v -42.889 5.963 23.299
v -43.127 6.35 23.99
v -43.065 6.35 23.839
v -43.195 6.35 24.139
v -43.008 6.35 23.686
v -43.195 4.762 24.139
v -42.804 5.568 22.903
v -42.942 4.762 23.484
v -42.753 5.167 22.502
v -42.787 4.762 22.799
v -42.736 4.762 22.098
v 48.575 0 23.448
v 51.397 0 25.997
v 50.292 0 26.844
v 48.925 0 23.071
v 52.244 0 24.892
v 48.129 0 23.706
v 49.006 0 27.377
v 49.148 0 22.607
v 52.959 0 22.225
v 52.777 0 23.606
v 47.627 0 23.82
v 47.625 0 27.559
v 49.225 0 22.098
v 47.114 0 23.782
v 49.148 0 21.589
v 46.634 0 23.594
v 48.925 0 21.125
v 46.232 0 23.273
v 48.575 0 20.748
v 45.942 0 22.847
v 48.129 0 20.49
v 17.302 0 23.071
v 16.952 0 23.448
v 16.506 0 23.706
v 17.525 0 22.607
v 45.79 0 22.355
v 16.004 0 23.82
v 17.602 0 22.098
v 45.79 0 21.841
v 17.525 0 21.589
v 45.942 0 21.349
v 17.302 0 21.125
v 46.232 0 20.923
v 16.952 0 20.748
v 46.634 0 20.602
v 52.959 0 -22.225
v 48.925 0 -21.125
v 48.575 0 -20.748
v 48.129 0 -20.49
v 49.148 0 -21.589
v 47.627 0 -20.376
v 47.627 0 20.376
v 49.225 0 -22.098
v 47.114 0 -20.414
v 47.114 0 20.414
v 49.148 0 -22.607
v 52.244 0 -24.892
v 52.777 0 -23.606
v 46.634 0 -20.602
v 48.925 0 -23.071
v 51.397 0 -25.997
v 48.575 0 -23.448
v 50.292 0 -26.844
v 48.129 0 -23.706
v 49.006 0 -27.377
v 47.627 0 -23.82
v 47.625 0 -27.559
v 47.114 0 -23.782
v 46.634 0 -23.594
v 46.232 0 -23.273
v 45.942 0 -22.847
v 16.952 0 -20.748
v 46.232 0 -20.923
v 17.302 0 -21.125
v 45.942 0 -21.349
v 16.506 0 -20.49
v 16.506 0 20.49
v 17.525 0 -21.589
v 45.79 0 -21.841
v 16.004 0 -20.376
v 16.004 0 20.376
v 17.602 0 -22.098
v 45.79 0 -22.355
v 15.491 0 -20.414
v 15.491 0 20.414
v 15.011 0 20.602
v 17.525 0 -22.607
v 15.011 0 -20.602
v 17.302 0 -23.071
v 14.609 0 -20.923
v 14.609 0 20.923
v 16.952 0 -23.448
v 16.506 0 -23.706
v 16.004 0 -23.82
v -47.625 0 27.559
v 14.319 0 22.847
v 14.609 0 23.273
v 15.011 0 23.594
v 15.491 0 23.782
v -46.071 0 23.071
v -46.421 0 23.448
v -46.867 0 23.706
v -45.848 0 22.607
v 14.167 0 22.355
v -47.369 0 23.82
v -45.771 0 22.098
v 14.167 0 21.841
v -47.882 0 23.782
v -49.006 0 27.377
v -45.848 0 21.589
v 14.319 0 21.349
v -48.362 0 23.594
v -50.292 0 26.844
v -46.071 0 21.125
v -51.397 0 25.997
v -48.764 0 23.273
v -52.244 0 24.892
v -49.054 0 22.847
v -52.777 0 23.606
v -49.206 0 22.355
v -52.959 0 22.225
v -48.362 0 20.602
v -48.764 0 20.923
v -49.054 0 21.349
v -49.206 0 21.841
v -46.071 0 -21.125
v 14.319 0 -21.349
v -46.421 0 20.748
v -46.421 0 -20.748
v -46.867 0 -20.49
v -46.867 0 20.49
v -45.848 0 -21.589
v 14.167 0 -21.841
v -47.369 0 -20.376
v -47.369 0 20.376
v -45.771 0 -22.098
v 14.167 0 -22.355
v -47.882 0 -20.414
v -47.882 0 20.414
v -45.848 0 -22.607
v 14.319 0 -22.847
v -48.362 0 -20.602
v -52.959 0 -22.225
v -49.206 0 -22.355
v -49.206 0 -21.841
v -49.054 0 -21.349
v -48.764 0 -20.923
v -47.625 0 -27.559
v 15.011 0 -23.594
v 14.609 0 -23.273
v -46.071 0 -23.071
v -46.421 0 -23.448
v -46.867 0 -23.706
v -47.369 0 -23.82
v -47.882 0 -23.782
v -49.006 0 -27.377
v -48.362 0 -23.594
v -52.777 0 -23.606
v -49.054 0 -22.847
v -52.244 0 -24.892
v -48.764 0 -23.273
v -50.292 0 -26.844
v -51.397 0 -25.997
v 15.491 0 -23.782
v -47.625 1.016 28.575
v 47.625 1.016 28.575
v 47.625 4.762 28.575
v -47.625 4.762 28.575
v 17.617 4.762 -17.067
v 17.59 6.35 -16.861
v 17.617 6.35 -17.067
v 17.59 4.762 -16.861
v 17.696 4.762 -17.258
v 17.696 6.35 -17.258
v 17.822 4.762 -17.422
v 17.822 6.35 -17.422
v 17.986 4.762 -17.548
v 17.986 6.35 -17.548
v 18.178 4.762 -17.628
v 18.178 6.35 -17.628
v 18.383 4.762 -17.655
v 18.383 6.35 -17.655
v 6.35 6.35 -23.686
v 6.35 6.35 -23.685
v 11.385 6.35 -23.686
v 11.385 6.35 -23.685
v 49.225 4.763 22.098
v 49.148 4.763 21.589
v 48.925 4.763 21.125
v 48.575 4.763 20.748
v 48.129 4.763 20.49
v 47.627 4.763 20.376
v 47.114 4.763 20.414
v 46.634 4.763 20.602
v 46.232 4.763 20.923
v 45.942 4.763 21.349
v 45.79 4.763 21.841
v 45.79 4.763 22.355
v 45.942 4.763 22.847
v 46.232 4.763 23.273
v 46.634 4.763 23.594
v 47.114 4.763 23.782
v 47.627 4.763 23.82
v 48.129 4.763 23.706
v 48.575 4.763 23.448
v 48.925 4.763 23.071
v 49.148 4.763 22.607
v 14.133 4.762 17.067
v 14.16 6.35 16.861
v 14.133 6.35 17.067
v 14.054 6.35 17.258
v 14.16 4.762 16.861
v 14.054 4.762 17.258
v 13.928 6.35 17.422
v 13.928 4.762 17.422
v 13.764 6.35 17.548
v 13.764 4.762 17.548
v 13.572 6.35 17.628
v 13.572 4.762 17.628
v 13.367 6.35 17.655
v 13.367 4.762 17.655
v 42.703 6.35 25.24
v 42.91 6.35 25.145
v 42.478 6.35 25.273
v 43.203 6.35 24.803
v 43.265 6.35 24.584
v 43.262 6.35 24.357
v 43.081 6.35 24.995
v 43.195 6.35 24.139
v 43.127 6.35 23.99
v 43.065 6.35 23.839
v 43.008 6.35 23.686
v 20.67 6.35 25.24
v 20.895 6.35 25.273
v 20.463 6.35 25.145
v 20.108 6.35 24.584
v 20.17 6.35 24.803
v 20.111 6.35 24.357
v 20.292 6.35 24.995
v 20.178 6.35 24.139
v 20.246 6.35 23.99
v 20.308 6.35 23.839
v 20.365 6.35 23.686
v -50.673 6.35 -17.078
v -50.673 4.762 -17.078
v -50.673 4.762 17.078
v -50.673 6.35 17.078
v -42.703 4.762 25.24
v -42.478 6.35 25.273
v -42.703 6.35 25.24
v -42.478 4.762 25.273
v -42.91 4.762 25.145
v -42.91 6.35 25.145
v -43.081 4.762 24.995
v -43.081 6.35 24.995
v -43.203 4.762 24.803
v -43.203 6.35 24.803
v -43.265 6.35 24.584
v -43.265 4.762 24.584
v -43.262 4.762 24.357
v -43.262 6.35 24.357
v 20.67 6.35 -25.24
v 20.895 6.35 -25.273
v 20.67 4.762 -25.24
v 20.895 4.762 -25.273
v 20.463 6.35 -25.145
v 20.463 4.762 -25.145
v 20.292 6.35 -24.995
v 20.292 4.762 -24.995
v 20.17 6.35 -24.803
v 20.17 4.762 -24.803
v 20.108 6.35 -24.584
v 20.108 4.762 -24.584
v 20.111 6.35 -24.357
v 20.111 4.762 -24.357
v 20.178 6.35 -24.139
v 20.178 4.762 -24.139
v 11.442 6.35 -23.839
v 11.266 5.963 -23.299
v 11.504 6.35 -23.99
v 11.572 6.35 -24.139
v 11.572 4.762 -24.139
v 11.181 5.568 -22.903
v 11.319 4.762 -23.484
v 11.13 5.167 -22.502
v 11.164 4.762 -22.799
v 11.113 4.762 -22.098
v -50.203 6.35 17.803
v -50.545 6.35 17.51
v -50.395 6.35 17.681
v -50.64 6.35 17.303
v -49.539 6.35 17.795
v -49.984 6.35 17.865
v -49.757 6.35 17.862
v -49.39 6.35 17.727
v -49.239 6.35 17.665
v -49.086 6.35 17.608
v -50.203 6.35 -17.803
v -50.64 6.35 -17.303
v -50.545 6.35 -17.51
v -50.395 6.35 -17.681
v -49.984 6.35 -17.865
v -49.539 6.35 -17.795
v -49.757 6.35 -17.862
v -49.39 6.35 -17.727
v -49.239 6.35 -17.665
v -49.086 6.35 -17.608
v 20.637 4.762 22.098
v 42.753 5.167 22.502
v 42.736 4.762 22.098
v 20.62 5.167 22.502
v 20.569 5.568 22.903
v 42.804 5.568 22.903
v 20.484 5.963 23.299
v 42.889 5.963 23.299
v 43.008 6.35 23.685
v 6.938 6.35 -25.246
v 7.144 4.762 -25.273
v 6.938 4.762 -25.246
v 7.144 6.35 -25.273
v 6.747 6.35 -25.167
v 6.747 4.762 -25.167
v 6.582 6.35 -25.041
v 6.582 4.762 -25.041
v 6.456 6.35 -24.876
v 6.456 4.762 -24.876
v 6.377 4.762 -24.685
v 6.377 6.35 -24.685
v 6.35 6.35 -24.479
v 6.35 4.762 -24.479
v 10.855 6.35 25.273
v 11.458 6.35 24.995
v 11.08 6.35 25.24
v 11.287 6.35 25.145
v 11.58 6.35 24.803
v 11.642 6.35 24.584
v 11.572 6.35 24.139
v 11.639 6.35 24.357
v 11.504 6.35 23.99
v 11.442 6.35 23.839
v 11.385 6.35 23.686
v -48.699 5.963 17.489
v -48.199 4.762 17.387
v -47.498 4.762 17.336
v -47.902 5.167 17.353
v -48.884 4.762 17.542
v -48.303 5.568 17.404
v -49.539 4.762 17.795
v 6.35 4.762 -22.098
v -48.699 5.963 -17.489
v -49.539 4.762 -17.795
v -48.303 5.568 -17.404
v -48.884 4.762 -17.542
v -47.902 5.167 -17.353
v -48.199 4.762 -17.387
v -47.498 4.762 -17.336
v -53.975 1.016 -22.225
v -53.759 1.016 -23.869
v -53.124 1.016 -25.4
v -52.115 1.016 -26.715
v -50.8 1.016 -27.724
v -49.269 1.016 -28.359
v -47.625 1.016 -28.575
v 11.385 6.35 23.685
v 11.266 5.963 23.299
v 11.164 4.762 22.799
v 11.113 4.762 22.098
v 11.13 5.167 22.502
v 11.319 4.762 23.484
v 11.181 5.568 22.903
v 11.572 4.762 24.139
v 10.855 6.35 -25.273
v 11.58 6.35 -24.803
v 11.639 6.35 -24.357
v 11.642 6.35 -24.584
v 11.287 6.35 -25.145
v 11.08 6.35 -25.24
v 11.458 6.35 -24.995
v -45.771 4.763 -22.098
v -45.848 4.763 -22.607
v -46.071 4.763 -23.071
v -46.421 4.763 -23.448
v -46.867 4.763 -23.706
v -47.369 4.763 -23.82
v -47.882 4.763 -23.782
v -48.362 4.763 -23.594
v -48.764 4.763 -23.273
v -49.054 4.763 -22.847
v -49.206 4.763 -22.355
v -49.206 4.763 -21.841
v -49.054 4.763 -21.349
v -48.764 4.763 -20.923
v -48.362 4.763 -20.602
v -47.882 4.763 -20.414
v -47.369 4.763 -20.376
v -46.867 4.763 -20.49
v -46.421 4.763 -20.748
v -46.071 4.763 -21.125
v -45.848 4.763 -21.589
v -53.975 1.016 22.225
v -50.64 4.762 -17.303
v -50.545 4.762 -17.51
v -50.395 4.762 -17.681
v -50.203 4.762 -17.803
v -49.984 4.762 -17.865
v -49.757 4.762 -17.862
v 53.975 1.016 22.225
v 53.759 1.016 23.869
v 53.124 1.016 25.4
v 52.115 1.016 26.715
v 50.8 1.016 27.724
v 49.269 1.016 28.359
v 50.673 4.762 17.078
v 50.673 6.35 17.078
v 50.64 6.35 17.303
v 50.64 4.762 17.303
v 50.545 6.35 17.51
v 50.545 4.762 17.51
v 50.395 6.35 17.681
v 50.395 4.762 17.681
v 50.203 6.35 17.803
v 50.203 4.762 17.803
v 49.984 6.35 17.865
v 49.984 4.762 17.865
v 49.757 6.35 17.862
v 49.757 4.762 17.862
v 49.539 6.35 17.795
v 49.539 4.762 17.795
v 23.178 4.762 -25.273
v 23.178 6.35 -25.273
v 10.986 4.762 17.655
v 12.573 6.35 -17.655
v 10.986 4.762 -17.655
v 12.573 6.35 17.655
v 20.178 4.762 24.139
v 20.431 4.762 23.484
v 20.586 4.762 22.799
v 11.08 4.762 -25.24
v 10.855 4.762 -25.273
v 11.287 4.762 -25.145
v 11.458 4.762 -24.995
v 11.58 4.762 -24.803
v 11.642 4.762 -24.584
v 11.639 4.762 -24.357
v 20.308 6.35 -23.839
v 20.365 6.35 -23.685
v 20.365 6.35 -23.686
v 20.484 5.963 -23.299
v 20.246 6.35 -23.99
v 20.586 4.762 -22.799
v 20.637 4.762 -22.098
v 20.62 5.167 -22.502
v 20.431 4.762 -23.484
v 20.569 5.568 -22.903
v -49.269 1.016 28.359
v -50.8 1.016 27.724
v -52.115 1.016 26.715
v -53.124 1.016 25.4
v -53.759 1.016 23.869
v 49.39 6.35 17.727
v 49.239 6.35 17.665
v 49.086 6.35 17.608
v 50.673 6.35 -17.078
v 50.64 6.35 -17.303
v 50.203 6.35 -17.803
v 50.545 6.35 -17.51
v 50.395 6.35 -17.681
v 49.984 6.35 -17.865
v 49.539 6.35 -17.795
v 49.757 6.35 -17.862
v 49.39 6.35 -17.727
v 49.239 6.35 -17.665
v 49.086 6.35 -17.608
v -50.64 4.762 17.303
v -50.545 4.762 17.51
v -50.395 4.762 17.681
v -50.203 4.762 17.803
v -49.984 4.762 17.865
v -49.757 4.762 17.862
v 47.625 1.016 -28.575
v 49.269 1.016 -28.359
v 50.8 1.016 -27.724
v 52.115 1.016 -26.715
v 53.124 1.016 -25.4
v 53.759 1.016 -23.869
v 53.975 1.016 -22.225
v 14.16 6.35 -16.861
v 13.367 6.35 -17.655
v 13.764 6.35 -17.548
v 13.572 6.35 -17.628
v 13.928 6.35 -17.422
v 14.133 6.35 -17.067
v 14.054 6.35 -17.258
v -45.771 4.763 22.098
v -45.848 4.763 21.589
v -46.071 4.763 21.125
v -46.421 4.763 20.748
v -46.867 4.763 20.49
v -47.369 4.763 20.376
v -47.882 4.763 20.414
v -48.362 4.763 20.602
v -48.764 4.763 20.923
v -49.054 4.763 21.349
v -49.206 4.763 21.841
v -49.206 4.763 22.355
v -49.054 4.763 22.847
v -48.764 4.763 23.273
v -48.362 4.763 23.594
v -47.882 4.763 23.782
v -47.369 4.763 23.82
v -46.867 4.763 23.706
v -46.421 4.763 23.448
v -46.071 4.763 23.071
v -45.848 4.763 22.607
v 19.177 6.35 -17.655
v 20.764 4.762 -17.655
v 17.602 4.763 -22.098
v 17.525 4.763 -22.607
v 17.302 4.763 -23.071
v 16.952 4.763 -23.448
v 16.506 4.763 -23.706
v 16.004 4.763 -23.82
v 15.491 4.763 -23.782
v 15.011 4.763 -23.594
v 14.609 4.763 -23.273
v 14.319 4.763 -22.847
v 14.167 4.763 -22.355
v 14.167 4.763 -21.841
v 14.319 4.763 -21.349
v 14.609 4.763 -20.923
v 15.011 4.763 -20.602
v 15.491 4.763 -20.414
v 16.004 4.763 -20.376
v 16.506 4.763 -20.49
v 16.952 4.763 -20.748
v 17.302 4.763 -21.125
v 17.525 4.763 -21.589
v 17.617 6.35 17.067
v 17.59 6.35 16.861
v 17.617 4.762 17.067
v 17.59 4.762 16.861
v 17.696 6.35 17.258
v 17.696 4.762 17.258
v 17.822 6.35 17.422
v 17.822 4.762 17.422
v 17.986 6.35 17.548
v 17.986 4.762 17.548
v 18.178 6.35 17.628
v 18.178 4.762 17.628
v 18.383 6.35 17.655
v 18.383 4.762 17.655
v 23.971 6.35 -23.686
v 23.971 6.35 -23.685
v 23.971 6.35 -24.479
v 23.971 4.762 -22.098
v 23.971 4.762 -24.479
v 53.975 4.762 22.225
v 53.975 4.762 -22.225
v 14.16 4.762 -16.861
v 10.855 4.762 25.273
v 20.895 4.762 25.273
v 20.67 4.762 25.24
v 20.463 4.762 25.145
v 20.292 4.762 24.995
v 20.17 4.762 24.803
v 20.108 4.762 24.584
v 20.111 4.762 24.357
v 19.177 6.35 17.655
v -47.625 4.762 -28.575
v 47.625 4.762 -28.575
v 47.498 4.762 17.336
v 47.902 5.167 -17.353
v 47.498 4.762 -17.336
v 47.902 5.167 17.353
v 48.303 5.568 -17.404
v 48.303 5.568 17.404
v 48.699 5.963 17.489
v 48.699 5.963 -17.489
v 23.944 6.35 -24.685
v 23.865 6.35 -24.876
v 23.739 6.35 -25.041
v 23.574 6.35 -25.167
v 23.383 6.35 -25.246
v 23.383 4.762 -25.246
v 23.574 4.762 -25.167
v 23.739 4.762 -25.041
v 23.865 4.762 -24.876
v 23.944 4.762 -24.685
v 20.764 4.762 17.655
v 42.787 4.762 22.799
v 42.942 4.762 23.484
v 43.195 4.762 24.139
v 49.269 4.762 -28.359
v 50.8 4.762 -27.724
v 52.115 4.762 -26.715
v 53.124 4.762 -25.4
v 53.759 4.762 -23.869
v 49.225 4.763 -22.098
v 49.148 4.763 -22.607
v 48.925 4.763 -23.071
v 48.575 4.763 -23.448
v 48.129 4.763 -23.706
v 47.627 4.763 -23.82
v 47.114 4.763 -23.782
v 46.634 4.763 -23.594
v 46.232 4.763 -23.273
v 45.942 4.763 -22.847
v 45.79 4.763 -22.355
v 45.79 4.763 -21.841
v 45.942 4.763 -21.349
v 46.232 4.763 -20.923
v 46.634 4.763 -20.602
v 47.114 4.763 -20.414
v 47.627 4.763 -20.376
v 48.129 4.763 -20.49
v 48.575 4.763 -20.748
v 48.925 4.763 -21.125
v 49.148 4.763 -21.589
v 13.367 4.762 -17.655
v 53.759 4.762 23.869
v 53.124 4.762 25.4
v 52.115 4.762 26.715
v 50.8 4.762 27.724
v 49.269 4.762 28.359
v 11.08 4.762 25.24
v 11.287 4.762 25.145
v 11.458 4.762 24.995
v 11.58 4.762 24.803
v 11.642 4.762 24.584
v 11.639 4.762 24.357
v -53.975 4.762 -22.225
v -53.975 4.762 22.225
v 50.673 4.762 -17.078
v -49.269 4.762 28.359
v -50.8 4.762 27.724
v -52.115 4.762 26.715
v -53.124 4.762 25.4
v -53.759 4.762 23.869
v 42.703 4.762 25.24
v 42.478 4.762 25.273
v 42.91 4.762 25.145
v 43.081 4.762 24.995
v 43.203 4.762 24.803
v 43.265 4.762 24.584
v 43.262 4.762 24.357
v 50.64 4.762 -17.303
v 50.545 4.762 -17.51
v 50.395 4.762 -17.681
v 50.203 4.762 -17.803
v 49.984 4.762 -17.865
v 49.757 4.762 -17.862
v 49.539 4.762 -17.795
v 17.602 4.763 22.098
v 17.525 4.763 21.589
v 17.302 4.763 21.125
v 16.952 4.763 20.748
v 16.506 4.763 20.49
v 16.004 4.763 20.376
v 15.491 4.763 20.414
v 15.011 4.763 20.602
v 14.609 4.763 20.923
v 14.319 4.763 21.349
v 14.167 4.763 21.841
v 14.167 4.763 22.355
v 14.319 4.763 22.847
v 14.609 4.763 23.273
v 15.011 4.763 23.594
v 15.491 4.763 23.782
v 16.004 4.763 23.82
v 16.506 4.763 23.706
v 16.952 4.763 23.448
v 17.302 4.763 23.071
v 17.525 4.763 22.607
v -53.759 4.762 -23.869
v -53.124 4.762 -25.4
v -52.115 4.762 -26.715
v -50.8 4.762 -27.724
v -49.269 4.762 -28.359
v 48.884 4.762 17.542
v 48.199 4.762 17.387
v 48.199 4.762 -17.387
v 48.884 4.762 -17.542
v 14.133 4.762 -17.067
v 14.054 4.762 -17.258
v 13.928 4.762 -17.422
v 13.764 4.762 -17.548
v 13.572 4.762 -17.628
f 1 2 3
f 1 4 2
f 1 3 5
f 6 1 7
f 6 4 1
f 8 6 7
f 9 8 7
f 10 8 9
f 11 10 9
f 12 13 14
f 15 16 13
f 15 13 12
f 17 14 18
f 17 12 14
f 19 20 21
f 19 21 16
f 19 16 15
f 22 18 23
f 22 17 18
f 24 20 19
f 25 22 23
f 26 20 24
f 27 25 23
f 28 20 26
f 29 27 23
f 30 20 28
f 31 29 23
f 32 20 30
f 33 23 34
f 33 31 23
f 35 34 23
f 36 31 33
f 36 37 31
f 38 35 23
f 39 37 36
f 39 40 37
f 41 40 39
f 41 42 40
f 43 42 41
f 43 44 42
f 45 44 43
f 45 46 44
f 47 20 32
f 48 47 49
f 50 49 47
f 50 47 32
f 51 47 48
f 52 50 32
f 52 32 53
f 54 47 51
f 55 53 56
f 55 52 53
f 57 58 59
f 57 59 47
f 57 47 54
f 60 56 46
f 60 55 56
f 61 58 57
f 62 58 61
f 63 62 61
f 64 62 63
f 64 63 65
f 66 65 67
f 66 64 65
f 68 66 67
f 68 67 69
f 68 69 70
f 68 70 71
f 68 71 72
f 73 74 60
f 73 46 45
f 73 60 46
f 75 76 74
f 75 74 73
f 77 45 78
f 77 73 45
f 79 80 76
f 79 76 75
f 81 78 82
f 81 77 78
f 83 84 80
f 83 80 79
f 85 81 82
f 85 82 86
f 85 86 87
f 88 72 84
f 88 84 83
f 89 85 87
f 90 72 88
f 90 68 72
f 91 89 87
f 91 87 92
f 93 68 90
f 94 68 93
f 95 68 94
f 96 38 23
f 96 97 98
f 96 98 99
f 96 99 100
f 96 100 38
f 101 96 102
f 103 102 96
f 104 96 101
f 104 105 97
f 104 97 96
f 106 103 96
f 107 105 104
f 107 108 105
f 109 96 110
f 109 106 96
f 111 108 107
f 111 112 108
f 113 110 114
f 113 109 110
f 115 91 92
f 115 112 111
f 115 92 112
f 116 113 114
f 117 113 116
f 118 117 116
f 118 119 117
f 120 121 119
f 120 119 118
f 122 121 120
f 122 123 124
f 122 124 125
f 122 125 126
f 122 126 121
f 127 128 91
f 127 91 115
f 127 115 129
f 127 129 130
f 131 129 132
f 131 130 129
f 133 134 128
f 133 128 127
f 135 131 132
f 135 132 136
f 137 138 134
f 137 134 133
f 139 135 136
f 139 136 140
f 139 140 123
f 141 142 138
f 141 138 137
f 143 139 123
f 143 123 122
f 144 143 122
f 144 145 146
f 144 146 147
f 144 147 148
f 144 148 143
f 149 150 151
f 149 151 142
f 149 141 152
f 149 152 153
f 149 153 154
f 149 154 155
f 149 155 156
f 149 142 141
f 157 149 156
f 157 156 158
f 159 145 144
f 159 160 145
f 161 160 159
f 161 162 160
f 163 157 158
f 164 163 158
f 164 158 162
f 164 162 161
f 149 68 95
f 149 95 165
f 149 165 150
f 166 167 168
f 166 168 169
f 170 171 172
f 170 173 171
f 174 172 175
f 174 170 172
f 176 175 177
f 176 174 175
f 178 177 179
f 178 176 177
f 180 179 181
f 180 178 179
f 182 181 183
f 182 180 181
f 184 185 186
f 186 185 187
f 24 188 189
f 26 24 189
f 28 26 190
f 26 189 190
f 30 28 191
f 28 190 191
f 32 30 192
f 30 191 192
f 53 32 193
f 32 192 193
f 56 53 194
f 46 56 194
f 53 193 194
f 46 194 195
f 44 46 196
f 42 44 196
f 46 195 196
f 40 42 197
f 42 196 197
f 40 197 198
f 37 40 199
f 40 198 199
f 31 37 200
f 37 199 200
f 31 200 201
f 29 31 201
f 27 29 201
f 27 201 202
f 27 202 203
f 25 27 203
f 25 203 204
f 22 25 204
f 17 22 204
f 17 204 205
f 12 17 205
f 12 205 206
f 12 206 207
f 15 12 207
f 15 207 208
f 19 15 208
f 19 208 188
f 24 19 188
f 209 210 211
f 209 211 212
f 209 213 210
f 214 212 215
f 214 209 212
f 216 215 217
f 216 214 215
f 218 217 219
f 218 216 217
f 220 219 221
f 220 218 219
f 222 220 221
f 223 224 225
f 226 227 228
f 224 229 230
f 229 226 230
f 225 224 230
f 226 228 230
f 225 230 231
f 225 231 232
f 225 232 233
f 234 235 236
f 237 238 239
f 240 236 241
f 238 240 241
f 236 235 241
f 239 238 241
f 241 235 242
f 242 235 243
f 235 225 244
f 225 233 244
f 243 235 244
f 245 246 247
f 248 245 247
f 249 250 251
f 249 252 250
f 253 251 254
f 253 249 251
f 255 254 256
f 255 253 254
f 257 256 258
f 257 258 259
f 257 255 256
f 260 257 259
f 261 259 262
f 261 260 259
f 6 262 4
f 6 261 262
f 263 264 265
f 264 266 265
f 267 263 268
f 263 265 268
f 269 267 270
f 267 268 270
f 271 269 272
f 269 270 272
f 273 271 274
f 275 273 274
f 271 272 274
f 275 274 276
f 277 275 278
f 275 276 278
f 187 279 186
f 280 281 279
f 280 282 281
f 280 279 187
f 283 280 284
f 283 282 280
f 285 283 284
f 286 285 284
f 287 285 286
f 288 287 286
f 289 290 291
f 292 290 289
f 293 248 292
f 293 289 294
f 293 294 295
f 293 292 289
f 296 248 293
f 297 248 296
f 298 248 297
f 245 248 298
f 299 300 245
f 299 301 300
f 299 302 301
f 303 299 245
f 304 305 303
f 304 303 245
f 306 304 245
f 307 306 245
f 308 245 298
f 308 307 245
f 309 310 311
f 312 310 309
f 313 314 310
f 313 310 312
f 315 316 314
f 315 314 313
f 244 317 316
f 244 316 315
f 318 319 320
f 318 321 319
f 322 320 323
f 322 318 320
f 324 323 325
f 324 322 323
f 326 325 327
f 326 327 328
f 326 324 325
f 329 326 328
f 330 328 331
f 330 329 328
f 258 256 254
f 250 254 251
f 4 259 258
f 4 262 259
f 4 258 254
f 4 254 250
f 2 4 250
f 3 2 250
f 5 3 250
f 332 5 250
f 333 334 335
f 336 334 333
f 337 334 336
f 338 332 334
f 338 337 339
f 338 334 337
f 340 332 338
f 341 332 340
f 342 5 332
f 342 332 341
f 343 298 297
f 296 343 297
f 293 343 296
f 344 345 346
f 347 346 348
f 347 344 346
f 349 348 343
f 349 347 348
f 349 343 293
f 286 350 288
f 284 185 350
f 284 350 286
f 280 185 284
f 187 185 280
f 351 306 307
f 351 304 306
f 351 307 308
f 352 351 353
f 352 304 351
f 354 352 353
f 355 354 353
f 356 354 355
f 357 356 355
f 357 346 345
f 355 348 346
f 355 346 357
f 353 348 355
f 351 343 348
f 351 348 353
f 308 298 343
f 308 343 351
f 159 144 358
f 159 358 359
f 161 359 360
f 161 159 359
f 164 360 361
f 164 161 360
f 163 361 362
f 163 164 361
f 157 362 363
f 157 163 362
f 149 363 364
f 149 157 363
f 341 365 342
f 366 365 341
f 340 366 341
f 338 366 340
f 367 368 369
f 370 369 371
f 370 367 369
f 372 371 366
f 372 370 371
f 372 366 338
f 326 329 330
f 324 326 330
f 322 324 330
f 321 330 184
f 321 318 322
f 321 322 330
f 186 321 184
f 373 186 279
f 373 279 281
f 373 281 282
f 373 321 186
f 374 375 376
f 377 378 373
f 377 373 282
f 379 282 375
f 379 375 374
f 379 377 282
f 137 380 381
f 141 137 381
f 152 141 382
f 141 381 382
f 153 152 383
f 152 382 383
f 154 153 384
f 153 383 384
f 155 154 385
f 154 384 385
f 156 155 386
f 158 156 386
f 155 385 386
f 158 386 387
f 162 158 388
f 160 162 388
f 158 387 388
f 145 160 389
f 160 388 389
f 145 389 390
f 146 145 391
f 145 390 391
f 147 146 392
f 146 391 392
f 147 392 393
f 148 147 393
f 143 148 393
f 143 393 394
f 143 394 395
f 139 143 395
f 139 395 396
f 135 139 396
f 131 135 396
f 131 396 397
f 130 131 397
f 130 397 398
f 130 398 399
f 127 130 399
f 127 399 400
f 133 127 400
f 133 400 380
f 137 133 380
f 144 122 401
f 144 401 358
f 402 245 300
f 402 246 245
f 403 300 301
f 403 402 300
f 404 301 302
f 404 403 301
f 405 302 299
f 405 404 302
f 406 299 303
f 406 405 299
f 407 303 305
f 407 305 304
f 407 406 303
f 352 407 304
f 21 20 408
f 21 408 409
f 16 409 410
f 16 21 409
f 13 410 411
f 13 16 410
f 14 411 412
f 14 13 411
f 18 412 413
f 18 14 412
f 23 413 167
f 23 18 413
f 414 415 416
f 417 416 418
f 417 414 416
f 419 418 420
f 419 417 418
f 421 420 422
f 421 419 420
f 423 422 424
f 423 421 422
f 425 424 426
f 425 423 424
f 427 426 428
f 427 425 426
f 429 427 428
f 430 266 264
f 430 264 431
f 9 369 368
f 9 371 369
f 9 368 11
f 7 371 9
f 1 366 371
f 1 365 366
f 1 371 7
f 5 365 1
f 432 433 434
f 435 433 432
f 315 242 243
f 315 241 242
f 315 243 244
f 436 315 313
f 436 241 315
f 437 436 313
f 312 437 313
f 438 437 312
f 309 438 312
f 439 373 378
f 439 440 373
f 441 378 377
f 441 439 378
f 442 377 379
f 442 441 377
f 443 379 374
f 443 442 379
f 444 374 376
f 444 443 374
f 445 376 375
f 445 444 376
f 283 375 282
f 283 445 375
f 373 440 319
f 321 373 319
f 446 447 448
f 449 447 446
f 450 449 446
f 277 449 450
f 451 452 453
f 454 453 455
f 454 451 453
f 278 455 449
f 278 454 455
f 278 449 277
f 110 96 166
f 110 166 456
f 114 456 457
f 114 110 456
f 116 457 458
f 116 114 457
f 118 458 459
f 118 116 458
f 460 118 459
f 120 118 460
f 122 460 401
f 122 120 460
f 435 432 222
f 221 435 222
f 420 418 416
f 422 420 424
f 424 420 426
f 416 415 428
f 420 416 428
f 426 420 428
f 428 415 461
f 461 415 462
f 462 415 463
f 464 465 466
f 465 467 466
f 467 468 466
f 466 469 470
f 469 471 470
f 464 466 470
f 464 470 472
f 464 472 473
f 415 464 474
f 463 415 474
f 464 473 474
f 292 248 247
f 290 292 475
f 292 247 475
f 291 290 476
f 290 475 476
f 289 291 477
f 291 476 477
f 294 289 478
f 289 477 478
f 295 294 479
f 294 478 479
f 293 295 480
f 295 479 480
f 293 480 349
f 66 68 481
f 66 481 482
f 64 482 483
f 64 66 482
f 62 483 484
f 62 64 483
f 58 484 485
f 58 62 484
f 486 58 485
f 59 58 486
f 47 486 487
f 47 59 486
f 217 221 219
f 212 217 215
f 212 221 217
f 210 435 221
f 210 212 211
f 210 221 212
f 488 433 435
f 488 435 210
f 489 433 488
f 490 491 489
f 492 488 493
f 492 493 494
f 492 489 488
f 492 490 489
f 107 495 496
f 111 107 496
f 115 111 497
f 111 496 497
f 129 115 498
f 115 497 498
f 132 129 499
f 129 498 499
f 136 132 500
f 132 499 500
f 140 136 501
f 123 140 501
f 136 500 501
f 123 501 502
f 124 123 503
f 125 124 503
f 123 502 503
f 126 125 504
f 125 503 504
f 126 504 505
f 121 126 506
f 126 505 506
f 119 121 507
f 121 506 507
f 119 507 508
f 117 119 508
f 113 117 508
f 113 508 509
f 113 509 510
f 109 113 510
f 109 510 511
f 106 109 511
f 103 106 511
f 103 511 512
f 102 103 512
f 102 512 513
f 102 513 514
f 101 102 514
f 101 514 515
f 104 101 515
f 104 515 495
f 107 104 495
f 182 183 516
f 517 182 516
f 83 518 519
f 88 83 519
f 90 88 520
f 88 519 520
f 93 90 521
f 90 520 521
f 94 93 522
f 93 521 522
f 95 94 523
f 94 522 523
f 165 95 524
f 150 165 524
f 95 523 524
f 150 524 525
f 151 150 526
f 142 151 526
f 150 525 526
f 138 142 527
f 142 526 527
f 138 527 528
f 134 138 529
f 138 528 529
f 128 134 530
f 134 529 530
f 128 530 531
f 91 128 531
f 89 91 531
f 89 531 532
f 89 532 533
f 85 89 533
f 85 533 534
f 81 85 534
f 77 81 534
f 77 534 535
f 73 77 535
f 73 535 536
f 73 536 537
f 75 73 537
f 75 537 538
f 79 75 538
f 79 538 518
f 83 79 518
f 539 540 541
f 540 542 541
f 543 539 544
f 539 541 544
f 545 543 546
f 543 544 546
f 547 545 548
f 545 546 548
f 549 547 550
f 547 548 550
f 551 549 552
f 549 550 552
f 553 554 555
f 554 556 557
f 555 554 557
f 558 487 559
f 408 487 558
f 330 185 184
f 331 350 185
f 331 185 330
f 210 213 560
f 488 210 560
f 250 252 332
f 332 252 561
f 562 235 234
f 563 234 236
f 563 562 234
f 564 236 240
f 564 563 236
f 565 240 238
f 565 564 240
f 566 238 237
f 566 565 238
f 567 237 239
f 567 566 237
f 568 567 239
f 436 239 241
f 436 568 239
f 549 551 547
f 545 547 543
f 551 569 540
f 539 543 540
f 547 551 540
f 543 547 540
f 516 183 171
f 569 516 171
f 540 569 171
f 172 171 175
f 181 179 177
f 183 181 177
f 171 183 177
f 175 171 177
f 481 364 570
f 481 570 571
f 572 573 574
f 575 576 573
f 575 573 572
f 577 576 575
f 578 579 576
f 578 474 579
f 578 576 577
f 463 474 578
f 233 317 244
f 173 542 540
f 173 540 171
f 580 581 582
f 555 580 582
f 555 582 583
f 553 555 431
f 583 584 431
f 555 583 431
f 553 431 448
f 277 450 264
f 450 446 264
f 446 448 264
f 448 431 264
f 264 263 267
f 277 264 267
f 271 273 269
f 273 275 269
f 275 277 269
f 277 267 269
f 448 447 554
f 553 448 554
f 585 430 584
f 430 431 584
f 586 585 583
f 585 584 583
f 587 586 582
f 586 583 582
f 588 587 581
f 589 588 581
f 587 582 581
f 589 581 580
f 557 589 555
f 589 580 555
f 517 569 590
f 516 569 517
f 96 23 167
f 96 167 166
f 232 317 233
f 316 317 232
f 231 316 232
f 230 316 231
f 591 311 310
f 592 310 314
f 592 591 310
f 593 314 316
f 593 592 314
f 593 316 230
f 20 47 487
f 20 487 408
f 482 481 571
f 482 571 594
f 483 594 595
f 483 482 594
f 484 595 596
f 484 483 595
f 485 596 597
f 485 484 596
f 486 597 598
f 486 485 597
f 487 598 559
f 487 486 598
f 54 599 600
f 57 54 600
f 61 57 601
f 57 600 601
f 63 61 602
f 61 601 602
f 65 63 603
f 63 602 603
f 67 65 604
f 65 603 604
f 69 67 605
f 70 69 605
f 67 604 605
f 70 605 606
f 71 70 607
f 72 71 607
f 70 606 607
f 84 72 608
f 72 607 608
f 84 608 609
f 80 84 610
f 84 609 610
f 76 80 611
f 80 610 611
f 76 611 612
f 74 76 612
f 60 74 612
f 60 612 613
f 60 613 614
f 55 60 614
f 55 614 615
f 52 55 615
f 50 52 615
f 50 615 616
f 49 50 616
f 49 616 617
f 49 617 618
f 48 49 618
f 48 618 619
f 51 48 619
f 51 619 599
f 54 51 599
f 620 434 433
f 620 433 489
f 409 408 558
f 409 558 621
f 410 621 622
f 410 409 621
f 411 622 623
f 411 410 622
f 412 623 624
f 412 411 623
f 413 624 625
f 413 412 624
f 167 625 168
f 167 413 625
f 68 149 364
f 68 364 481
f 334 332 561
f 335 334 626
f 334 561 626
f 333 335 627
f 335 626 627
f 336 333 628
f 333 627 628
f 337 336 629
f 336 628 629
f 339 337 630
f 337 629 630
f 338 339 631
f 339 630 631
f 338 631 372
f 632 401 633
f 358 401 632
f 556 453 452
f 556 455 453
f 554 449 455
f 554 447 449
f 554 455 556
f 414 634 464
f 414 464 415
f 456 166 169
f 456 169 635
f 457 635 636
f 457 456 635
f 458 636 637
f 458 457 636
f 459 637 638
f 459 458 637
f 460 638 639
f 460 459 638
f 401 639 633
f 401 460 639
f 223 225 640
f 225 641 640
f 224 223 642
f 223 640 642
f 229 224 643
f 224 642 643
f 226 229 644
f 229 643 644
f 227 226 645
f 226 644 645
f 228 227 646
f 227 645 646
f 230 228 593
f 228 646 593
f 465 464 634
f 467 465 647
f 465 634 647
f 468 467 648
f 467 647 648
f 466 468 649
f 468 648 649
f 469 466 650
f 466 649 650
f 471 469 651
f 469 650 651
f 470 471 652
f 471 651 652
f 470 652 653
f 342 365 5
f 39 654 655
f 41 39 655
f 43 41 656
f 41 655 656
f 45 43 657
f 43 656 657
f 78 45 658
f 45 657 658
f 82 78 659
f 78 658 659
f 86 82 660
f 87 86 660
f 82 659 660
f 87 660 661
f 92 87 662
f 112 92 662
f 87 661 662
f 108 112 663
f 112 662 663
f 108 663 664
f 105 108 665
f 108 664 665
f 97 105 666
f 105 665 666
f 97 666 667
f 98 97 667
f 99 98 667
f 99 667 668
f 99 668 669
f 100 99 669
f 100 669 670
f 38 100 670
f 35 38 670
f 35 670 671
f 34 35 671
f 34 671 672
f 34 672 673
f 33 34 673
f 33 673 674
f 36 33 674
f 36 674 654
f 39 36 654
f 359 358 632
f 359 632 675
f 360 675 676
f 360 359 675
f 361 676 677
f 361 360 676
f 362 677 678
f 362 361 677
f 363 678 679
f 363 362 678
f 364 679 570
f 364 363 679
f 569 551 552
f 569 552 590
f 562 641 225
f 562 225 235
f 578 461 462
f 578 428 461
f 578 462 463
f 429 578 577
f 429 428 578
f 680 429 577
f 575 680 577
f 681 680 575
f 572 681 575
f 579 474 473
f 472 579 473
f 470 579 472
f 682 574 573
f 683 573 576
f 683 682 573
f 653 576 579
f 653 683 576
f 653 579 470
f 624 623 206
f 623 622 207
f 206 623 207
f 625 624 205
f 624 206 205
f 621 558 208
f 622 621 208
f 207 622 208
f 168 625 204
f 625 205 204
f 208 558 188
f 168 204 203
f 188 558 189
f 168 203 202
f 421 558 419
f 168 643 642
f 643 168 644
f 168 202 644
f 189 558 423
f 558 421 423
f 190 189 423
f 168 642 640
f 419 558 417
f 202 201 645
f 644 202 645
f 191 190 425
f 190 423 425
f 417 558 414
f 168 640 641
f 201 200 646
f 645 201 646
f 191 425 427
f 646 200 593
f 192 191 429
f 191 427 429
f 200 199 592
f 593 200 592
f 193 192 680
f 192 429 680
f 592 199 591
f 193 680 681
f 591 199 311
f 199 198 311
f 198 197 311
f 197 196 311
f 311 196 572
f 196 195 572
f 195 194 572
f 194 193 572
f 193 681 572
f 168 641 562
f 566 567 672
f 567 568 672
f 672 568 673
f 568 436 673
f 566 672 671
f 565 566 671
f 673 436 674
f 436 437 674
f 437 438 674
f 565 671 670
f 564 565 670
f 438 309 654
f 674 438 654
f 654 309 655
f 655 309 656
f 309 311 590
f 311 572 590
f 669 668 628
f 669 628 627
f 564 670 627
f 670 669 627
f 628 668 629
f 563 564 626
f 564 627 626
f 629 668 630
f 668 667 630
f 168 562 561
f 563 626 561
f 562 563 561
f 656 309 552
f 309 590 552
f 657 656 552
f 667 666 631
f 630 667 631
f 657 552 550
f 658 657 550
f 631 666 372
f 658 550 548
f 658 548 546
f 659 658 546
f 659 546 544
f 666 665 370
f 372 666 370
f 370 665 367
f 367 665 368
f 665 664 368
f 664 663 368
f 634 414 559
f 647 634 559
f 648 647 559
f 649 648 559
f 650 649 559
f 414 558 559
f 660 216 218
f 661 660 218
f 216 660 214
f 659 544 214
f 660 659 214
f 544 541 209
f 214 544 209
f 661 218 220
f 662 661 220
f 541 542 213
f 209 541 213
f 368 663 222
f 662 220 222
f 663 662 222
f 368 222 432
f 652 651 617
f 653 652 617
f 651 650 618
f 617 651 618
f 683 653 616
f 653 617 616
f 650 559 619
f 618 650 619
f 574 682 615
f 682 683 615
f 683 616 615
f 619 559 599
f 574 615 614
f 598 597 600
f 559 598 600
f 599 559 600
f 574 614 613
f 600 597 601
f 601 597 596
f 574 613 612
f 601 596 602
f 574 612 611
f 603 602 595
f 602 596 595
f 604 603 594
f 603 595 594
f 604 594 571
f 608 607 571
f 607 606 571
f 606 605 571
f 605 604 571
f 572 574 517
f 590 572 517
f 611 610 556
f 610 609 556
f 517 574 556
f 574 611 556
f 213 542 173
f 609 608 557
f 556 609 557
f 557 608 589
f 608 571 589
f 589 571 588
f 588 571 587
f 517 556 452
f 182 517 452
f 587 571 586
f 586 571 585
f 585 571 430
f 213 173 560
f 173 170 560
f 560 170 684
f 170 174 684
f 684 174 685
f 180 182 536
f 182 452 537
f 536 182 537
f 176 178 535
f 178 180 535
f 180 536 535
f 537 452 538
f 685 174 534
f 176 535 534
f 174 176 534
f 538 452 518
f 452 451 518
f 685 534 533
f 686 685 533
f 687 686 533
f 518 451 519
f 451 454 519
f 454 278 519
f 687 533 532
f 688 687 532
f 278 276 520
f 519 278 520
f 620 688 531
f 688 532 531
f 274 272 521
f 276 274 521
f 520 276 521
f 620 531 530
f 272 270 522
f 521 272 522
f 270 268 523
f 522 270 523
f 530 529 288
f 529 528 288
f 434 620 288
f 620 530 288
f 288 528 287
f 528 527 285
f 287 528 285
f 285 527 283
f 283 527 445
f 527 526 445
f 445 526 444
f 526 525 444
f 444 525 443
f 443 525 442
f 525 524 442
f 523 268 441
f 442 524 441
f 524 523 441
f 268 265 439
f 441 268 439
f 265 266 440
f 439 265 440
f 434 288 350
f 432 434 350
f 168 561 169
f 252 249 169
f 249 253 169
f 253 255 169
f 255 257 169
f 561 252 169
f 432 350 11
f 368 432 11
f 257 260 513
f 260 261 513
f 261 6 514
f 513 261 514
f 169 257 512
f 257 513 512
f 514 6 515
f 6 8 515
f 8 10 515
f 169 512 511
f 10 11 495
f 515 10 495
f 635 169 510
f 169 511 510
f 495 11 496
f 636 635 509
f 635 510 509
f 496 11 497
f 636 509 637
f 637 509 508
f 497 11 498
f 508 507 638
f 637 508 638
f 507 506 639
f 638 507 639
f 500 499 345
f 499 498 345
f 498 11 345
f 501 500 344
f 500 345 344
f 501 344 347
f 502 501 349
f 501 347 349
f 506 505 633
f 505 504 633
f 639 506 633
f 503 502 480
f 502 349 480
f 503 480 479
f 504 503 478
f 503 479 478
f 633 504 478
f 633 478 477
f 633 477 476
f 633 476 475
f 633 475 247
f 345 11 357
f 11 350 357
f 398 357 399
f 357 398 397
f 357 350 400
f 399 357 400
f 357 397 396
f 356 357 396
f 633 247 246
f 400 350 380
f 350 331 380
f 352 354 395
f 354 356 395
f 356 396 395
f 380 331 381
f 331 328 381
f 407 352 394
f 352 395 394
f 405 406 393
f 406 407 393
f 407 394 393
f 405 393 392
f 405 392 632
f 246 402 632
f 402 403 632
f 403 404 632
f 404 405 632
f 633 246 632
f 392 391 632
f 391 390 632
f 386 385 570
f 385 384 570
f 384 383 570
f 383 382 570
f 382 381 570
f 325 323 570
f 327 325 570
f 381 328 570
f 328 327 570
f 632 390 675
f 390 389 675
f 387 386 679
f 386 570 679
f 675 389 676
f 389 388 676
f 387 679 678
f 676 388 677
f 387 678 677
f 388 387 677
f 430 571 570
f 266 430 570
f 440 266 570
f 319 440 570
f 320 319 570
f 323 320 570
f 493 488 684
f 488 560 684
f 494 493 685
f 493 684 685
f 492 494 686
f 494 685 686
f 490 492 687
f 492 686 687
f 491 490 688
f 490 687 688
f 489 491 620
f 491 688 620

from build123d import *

# Parameters (mm, degrees)
BOSS_EXTRUDE1_DEPTH   = 4.7625
BOSS_EXTRUDE2_DEPTH   = 1.5875
SKETCH3_W             = 50.8
SKETCH3_H             = 1.5875
SKETCH3_W_2           = 20.32
CUT_EXTRUDE1_DEPTH    = 62.257755886
F_4_CLEARANCE_HOLE1_D = 3.4544
SKETCH6_R             = 4.7625
CUT_EXTRUDE2_DEPTH    = 62.257755886
SKETCH7_W             = 8.127020596
SKETCH7_H             = 2.415508094
SKETCH7_W_2           = 9.383301438
SKETCH7_H_2           = 3.436417543
CUT_EXTRUDE3_DEPTH    = 62.257755886
CHAMFER1_SIZE         = 1.5875
FILLET1_R             = 0.79375
CHAMFER2_SIZE         = 1.016


with BuildPart() as part:
    # Sketch1 → Boss-Extrude1 (new body)
    with BuildSketch(Plane(origin=(0, 0, 0), x_dir=(1, 0, 0), z_dir=(0, 1, 0))):
        with BuildLine():
            Line((-47.625, 28.575), (47.625, 28.575))
            ThreePointArc((47.625, 28.575), (52.115128061, 26.715128061), (53.975, 22.225))
            Line((53.975, 22.225), (53.975, -22.225))
            ThreePointArc((53.975, -22.225), (52.115128061, -26.715128061), (47.625, -28.575))
            Line((47.625, -28.575), (-47.625, -28.575))
            ThreePointArc((-47.625, -28.575), (-52.115128061, -26.715128061), (-53.975, -22.225))
            Line((-53.975, -22.225), (-53.975, 22.225))
            ThreePointArc((-53.975, 22.225), (-52.115128061, 26.715128061), (-47.625, 28.575))
        make_face()
    extrude(amount=BOSS_EXTRUDE1_DEPTH)

    # Sketch2 → Boss-Extrude2 (add)
    # profile 1 of 2: a face of its own
    with BuildSketch(Plane(origin=(0, 4.7625, 0), x_dir=(1, 0, 0), z_dir=(0, 1, 0))):
        with BuildLine():
            Line((-50.673, 22.225), (-50.673, -22.225))
            ThreePointArc((-50.673, -22.225), (-49.780261469, -24.380261469), (-47.625, -25.273))
            Line((-47.625, -25.273), (14.1605, -25.273))
            Line((14.1605, -25.273), (14.1605, 25.273))
            Line((14.1605, 25.273), (-47.625, 25.273))
            ThreePointArc((-47.625, 25.273), (-49.780261469, 24.380261469), (-50.673, 22.225))
        make_face()
        with BuildLine():
            Line((12.573, -23.6855), (-47.625, -23.6855))
            ThreePointArc((-47.625, -23.6855), (-48.657729454, -23.257729454), (-49.0855, -22.225))
            Line((-49.0855, -22.225), (-49.0855, 22.225))
            ThreePointArc((-49.0855, 22.225), (-48.657729454, 23.257729454), (-47.625, 23.6855))
            Line((-47.625, 23.6855), (12.573, 23.6855))
            Line((12.573, 23.6855), (12.573, -23.6855))
        make_face(mode=Mode.SUBTRACT)
    # profile 2 of 2: a face of its own
    with BuildSketch(Plane(origin=(0, 4.7625, 0), x_dir=(1, 0, 0), z_dir=(0, 1, 0))):
        with BuildLine():
            Line((47.625, -25.273), (17.5895, -25.273))
            Line((17.5895, -25.273), (17.5895, 25.273))
            Line((17.5895, 25.273), (47.625, 25.273))
            ThreePointArc((47.625, 25.273), (49.780261469, 24.380261469), (50.673, 22.225))
            Line((50.673, 22.225), (50.673, -22.225))
            ThreePointArc((50.673, -22.225), (49.780261469, -24.380261469), (47.625, -25.273))
        make_face()
        with BuildLine():
            Line((19.177, -23.6855), (19.177, 23.6855))
            Line((19.177, 23.6855), (47.625, 23.6855))
            ThreePointArc((47.625, 23.6855), (48.657729454, 23.257729454), (49.0855, 22.225))
            Line((49.0855, 22.225), (49.0855, -22.225))
            ThreePointArc((49.0855, -22.225), (48.657729454, -23.257729454), (47.625, -23.6855))
            Line((47.625, -23.6855), (19.177, -23.6855))
        make_face(mode=Mode.SUBTRACT)
    extrude(amount=BOSS_EXTRUDE2_DEPTH)

    # Sketch3 → Cut-Extrude1 (cut, through all)
    with BuildSketch(Plane(origin=(0, 4.7625, 0), x_dir=(1, 0, 0), z_dir=(0, 1, 0))):
        with Locations((-19.05, 24.47925)):
            Rectangle(SKETCH3_W, SKETCH3_H)
        with Locations((34.13125, 24.47925)):
            Rectangle(SKETCH3_W_2, SKETCH3_H)
    extrude(amount=CUT_EXTRUDE1_DEPTH, mode=Mode.SUBTRACT)

    # #4 Clearance Hole1 (through all)
    with Locations(Plane(origin=(0, 0, 0), x_dir=(-1, 0, 0), z_dir=(0, -1, 0))):
        with Locations((47.498, 22.098), (47.498, -22.098), (-15.875, -22.098), (-15.875, 22.098), (-47.498, 22.098), (-47.498, -22.098)):
            Hole(F_4_CLEARANCE_HOLE1_D / 2)

    # Sketch6 → Cut-Extrude2 (cut, through all)
    with BuildSketch(Plane(origin=(0, 4.7625, 0), x_dir=(1, 0, 0), z_dir=(0, 1, 0))):
        with Locations((47.498, 22.098)):
            Circle(SKETCH6_R)
        with Locations((47.498, -22.098)):
            Circle(SKETCH6_R)
        with Locations((15.875, -22.098)):
            Circle(SKETCH6_R)
        with Locations((15.875, 22.098)):
            Circle(SKETCH6_R)
        with Locations((-47.498, 22.098)):
            Circle(SKETCH6_R)
        with Locations((-47.498, -22.098)):
            Circle(SKETCH6_R)
    extrude(amount=CUT_EXTRUDE2_DEPTH, mode=Mode.SUBTRACT)

    # Sketch7 → Cut-Extrude3 (cut, through all)
    with BuildSketch(Plane(origin=(0, 4.7625, 0), x_dir=(1, 0, 0), z_dir=(0, 1, 0))):
        with Locations((15.913089186, 18.862568703)):
            Rectangle(SKETCH7_W, SKETCH7_H)
        with Locations((15.559399745, -19.373023428)):
            Rectangle(SKETCH7_W_2, SKETCH7_H_2)
    extrude(amount=CUT_EXTRUDE3_DEPTH, mode=Mode.SUBTRACT)

    # Chamfer1
    chamfer1_edges = [part.edges().sort_by_distance(p)[0] for p in [
        (-49.0855, 4.7625, 0),
        (8.86743597, 4.7625, -23.6855),
        (22.16818903, 4.7625, -23.6855),
        (49.0855, 4.7625, 0),
        (31.6865, 4.7625, 23.6855),
        (-15.8115, 4.7625, 23.6855),
        (12.573, 4.7625, 0),
        (19.177, 4.7625, 0),
    ]]
    chamfer(chamfer1_edges, length=CHAMFER1_SIZE - 0.0001)  # a hair under: the kernel refuses the full size

    # Fillet1
    fillet1_edges = [part.edges().sort_by_distance(p)[0] for p in [
        (6.35, 5.55625, -25.273),
        (23.97125, 5.55625, -25.273),
        (50.673, 5.55625, 18.548242086),
        (43.948242086, 5.55625, 25.273),
        (14.1605, 5.55625, 17.654814656),
        (17.5895, 5.55625, 17.654814656),
        (12.325242086, 5.55625, 25.273),
        (19.424757914, 5.55625, 25.273),
        (12.325242086, 5.55625, -25.273),
        (19.424757914, 5.55625, -25.273),
        (14.1605, 5.55625, -17.654814656),
        (17.5895, 5.55625, -17.654814656),
        (-50.673, 5.55625, -18.548242086),
        (-50.673, 5.55625, 18.548242086),
        (-43.948242086, 5.55625, 25.273),
        (50.673, 5.55625, -18.548242086),
    ]]
    fillet(fillet1_edges, radius=FILLET1_R)

    # Chamfer2
    chamfer2_edges = [part.edges().sort_by_distance(p)[0] for p in [
        (0, 0, -28.575),
        (52.115128061, 0, -26.715128061),
        (53.975, 0, 0),
        (52.115128061, 0, 26.715128061),
        (0, 0, 28.575),
        (-52.115128061, 0, 26.715128061),
        (-53.975, 0, 0),
        (-52.115128061, 0, -26.715128061),
    ]]
    chamfer(chamfer2_edges, length=CHAMFER2_SIZE)


solid = part.part
